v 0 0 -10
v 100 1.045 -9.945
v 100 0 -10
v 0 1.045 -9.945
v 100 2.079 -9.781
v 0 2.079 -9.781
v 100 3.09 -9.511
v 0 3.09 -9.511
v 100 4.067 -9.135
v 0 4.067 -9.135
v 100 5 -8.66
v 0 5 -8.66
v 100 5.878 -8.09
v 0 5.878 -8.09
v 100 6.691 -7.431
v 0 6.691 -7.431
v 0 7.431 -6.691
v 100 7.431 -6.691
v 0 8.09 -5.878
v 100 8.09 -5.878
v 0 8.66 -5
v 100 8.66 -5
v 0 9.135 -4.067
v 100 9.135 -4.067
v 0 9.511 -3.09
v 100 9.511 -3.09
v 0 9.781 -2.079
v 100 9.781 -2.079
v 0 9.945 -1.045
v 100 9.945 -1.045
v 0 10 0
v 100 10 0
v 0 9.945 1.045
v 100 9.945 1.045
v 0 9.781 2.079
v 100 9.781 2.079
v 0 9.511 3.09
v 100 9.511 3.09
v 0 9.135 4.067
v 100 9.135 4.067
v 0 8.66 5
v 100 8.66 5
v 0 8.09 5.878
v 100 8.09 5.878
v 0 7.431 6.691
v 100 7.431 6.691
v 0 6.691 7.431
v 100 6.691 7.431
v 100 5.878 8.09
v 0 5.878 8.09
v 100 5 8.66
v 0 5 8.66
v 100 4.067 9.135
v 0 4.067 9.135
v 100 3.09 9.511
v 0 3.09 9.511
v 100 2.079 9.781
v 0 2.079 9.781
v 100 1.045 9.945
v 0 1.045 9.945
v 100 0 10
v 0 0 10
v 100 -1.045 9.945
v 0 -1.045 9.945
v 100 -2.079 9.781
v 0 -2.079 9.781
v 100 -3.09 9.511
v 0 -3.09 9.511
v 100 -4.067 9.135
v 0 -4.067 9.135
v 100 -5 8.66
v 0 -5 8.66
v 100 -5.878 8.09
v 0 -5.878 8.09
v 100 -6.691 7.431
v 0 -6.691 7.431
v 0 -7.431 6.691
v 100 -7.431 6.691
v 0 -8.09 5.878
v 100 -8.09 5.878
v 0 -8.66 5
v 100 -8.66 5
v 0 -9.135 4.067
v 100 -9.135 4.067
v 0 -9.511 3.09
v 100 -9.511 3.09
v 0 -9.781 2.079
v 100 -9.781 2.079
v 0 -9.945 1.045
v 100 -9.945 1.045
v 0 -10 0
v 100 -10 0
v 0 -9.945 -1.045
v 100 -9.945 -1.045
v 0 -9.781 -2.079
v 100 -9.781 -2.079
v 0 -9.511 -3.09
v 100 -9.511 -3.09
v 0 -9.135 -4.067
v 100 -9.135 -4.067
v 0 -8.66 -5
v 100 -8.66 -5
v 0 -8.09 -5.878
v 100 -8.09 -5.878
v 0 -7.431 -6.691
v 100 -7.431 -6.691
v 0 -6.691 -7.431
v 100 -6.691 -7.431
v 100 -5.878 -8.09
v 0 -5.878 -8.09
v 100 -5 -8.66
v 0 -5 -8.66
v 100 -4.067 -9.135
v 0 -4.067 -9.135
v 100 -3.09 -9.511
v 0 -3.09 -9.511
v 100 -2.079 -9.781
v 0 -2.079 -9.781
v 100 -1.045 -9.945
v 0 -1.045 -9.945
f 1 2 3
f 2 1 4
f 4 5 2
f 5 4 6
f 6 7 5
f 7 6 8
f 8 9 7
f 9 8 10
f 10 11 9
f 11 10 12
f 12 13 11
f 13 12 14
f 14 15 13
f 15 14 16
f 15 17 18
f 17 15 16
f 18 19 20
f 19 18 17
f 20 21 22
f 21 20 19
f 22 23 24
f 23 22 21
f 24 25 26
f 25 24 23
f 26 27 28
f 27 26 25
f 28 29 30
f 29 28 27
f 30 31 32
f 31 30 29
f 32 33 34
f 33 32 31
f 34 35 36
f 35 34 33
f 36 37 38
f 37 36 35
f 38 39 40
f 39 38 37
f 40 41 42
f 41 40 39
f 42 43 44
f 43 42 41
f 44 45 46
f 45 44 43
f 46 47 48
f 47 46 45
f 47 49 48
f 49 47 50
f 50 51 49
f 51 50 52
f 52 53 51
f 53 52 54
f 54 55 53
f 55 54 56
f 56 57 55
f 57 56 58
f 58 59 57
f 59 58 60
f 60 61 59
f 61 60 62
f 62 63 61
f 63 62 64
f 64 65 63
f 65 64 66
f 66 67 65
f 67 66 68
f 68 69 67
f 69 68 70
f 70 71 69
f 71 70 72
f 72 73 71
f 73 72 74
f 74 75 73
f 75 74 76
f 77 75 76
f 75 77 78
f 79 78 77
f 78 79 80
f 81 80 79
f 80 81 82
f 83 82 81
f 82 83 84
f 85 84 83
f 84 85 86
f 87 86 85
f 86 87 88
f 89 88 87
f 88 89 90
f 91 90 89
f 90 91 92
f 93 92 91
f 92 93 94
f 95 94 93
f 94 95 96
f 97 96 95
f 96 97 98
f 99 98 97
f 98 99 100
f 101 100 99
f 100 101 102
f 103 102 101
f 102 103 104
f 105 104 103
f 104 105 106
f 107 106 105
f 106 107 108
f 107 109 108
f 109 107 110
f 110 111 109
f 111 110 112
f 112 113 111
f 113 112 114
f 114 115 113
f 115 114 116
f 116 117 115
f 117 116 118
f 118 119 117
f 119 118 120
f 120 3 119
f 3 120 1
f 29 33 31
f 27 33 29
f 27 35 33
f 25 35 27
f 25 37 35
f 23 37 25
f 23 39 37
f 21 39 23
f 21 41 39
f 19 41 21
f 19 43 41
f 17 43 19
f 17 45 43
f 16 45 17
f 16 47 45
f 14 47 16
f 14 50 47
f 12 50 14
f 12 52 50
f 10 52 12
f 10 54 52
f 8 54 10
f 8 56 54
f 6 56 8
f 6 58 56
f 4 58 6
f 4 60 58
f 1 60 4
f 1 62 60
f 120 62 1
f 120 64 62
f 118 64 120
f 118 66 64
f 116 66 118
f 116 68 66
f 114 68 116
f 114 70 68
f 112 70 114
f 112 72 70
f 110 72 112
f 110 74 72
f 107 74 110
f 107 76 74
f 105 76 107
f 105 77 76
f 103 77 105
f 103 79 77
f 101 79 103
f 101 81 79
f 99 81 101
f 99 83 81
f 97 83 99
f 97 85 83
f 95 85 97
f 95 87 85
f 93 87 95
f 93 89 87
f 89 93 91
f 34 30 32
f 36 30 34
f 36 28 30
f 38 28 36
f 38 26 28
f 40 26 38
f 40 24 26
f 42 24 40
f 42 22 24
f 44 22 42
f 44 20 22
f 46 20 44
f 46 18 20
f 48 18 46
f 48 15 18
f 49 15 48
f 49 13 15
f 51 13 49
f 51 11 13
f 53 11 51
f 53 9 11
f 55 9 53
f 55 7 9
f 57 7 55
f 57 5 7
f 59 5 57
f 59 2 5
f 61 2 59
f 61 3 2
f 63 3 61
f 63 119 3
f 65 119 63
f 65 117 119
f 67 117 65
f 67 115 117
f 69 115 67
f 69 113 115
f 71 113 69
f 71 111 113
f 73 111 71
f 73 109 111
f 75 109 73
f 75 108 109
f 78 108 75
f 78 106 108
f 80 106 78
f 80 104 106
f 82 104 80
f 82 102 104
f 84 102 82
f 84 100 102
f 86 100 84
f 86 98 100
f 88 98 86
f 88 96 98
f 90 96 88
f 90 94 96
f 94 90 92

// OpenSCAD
// =========================================================
// OpenSCAD Code: 100mm 圓柱體 (R=10) 沿 X 軸
// =========================================================

// 設定曲面平滑度
$fn = 60;

// --- 尺寸變數 ---
cylinder_length = 100; // L=100 mm (將沿 X 軸)
outer_radius = 10;     // R=10 mm

// 我們將使用 rotate() 將圓柱體從 Z 軸轉向 X 軸。
// 為了確保圓柱體的起點 (X=0) 位於世界座標的原點 [0, 0, 0]，
// 我們先讓圓柱體底部中心位於原點 (預設行為)，然後再旋轉。

rotate(a = 90, v = [0, 1, 0]) // 繞 Y 軸旋轉 90 度
{
    // cylinder() 預設沿 Z 軸，底部中心在 [0, 0, 0]。
    // 旋轉後：
    // Z 軸 (高度) --> 變為 X 軸 (長度)
    // X, Y 軸 (半徑) --> 變為 Y, Z 軸 (半徑)
    cylinder(
        h = cylinder_length,
        r = outer_radius
    );
}
